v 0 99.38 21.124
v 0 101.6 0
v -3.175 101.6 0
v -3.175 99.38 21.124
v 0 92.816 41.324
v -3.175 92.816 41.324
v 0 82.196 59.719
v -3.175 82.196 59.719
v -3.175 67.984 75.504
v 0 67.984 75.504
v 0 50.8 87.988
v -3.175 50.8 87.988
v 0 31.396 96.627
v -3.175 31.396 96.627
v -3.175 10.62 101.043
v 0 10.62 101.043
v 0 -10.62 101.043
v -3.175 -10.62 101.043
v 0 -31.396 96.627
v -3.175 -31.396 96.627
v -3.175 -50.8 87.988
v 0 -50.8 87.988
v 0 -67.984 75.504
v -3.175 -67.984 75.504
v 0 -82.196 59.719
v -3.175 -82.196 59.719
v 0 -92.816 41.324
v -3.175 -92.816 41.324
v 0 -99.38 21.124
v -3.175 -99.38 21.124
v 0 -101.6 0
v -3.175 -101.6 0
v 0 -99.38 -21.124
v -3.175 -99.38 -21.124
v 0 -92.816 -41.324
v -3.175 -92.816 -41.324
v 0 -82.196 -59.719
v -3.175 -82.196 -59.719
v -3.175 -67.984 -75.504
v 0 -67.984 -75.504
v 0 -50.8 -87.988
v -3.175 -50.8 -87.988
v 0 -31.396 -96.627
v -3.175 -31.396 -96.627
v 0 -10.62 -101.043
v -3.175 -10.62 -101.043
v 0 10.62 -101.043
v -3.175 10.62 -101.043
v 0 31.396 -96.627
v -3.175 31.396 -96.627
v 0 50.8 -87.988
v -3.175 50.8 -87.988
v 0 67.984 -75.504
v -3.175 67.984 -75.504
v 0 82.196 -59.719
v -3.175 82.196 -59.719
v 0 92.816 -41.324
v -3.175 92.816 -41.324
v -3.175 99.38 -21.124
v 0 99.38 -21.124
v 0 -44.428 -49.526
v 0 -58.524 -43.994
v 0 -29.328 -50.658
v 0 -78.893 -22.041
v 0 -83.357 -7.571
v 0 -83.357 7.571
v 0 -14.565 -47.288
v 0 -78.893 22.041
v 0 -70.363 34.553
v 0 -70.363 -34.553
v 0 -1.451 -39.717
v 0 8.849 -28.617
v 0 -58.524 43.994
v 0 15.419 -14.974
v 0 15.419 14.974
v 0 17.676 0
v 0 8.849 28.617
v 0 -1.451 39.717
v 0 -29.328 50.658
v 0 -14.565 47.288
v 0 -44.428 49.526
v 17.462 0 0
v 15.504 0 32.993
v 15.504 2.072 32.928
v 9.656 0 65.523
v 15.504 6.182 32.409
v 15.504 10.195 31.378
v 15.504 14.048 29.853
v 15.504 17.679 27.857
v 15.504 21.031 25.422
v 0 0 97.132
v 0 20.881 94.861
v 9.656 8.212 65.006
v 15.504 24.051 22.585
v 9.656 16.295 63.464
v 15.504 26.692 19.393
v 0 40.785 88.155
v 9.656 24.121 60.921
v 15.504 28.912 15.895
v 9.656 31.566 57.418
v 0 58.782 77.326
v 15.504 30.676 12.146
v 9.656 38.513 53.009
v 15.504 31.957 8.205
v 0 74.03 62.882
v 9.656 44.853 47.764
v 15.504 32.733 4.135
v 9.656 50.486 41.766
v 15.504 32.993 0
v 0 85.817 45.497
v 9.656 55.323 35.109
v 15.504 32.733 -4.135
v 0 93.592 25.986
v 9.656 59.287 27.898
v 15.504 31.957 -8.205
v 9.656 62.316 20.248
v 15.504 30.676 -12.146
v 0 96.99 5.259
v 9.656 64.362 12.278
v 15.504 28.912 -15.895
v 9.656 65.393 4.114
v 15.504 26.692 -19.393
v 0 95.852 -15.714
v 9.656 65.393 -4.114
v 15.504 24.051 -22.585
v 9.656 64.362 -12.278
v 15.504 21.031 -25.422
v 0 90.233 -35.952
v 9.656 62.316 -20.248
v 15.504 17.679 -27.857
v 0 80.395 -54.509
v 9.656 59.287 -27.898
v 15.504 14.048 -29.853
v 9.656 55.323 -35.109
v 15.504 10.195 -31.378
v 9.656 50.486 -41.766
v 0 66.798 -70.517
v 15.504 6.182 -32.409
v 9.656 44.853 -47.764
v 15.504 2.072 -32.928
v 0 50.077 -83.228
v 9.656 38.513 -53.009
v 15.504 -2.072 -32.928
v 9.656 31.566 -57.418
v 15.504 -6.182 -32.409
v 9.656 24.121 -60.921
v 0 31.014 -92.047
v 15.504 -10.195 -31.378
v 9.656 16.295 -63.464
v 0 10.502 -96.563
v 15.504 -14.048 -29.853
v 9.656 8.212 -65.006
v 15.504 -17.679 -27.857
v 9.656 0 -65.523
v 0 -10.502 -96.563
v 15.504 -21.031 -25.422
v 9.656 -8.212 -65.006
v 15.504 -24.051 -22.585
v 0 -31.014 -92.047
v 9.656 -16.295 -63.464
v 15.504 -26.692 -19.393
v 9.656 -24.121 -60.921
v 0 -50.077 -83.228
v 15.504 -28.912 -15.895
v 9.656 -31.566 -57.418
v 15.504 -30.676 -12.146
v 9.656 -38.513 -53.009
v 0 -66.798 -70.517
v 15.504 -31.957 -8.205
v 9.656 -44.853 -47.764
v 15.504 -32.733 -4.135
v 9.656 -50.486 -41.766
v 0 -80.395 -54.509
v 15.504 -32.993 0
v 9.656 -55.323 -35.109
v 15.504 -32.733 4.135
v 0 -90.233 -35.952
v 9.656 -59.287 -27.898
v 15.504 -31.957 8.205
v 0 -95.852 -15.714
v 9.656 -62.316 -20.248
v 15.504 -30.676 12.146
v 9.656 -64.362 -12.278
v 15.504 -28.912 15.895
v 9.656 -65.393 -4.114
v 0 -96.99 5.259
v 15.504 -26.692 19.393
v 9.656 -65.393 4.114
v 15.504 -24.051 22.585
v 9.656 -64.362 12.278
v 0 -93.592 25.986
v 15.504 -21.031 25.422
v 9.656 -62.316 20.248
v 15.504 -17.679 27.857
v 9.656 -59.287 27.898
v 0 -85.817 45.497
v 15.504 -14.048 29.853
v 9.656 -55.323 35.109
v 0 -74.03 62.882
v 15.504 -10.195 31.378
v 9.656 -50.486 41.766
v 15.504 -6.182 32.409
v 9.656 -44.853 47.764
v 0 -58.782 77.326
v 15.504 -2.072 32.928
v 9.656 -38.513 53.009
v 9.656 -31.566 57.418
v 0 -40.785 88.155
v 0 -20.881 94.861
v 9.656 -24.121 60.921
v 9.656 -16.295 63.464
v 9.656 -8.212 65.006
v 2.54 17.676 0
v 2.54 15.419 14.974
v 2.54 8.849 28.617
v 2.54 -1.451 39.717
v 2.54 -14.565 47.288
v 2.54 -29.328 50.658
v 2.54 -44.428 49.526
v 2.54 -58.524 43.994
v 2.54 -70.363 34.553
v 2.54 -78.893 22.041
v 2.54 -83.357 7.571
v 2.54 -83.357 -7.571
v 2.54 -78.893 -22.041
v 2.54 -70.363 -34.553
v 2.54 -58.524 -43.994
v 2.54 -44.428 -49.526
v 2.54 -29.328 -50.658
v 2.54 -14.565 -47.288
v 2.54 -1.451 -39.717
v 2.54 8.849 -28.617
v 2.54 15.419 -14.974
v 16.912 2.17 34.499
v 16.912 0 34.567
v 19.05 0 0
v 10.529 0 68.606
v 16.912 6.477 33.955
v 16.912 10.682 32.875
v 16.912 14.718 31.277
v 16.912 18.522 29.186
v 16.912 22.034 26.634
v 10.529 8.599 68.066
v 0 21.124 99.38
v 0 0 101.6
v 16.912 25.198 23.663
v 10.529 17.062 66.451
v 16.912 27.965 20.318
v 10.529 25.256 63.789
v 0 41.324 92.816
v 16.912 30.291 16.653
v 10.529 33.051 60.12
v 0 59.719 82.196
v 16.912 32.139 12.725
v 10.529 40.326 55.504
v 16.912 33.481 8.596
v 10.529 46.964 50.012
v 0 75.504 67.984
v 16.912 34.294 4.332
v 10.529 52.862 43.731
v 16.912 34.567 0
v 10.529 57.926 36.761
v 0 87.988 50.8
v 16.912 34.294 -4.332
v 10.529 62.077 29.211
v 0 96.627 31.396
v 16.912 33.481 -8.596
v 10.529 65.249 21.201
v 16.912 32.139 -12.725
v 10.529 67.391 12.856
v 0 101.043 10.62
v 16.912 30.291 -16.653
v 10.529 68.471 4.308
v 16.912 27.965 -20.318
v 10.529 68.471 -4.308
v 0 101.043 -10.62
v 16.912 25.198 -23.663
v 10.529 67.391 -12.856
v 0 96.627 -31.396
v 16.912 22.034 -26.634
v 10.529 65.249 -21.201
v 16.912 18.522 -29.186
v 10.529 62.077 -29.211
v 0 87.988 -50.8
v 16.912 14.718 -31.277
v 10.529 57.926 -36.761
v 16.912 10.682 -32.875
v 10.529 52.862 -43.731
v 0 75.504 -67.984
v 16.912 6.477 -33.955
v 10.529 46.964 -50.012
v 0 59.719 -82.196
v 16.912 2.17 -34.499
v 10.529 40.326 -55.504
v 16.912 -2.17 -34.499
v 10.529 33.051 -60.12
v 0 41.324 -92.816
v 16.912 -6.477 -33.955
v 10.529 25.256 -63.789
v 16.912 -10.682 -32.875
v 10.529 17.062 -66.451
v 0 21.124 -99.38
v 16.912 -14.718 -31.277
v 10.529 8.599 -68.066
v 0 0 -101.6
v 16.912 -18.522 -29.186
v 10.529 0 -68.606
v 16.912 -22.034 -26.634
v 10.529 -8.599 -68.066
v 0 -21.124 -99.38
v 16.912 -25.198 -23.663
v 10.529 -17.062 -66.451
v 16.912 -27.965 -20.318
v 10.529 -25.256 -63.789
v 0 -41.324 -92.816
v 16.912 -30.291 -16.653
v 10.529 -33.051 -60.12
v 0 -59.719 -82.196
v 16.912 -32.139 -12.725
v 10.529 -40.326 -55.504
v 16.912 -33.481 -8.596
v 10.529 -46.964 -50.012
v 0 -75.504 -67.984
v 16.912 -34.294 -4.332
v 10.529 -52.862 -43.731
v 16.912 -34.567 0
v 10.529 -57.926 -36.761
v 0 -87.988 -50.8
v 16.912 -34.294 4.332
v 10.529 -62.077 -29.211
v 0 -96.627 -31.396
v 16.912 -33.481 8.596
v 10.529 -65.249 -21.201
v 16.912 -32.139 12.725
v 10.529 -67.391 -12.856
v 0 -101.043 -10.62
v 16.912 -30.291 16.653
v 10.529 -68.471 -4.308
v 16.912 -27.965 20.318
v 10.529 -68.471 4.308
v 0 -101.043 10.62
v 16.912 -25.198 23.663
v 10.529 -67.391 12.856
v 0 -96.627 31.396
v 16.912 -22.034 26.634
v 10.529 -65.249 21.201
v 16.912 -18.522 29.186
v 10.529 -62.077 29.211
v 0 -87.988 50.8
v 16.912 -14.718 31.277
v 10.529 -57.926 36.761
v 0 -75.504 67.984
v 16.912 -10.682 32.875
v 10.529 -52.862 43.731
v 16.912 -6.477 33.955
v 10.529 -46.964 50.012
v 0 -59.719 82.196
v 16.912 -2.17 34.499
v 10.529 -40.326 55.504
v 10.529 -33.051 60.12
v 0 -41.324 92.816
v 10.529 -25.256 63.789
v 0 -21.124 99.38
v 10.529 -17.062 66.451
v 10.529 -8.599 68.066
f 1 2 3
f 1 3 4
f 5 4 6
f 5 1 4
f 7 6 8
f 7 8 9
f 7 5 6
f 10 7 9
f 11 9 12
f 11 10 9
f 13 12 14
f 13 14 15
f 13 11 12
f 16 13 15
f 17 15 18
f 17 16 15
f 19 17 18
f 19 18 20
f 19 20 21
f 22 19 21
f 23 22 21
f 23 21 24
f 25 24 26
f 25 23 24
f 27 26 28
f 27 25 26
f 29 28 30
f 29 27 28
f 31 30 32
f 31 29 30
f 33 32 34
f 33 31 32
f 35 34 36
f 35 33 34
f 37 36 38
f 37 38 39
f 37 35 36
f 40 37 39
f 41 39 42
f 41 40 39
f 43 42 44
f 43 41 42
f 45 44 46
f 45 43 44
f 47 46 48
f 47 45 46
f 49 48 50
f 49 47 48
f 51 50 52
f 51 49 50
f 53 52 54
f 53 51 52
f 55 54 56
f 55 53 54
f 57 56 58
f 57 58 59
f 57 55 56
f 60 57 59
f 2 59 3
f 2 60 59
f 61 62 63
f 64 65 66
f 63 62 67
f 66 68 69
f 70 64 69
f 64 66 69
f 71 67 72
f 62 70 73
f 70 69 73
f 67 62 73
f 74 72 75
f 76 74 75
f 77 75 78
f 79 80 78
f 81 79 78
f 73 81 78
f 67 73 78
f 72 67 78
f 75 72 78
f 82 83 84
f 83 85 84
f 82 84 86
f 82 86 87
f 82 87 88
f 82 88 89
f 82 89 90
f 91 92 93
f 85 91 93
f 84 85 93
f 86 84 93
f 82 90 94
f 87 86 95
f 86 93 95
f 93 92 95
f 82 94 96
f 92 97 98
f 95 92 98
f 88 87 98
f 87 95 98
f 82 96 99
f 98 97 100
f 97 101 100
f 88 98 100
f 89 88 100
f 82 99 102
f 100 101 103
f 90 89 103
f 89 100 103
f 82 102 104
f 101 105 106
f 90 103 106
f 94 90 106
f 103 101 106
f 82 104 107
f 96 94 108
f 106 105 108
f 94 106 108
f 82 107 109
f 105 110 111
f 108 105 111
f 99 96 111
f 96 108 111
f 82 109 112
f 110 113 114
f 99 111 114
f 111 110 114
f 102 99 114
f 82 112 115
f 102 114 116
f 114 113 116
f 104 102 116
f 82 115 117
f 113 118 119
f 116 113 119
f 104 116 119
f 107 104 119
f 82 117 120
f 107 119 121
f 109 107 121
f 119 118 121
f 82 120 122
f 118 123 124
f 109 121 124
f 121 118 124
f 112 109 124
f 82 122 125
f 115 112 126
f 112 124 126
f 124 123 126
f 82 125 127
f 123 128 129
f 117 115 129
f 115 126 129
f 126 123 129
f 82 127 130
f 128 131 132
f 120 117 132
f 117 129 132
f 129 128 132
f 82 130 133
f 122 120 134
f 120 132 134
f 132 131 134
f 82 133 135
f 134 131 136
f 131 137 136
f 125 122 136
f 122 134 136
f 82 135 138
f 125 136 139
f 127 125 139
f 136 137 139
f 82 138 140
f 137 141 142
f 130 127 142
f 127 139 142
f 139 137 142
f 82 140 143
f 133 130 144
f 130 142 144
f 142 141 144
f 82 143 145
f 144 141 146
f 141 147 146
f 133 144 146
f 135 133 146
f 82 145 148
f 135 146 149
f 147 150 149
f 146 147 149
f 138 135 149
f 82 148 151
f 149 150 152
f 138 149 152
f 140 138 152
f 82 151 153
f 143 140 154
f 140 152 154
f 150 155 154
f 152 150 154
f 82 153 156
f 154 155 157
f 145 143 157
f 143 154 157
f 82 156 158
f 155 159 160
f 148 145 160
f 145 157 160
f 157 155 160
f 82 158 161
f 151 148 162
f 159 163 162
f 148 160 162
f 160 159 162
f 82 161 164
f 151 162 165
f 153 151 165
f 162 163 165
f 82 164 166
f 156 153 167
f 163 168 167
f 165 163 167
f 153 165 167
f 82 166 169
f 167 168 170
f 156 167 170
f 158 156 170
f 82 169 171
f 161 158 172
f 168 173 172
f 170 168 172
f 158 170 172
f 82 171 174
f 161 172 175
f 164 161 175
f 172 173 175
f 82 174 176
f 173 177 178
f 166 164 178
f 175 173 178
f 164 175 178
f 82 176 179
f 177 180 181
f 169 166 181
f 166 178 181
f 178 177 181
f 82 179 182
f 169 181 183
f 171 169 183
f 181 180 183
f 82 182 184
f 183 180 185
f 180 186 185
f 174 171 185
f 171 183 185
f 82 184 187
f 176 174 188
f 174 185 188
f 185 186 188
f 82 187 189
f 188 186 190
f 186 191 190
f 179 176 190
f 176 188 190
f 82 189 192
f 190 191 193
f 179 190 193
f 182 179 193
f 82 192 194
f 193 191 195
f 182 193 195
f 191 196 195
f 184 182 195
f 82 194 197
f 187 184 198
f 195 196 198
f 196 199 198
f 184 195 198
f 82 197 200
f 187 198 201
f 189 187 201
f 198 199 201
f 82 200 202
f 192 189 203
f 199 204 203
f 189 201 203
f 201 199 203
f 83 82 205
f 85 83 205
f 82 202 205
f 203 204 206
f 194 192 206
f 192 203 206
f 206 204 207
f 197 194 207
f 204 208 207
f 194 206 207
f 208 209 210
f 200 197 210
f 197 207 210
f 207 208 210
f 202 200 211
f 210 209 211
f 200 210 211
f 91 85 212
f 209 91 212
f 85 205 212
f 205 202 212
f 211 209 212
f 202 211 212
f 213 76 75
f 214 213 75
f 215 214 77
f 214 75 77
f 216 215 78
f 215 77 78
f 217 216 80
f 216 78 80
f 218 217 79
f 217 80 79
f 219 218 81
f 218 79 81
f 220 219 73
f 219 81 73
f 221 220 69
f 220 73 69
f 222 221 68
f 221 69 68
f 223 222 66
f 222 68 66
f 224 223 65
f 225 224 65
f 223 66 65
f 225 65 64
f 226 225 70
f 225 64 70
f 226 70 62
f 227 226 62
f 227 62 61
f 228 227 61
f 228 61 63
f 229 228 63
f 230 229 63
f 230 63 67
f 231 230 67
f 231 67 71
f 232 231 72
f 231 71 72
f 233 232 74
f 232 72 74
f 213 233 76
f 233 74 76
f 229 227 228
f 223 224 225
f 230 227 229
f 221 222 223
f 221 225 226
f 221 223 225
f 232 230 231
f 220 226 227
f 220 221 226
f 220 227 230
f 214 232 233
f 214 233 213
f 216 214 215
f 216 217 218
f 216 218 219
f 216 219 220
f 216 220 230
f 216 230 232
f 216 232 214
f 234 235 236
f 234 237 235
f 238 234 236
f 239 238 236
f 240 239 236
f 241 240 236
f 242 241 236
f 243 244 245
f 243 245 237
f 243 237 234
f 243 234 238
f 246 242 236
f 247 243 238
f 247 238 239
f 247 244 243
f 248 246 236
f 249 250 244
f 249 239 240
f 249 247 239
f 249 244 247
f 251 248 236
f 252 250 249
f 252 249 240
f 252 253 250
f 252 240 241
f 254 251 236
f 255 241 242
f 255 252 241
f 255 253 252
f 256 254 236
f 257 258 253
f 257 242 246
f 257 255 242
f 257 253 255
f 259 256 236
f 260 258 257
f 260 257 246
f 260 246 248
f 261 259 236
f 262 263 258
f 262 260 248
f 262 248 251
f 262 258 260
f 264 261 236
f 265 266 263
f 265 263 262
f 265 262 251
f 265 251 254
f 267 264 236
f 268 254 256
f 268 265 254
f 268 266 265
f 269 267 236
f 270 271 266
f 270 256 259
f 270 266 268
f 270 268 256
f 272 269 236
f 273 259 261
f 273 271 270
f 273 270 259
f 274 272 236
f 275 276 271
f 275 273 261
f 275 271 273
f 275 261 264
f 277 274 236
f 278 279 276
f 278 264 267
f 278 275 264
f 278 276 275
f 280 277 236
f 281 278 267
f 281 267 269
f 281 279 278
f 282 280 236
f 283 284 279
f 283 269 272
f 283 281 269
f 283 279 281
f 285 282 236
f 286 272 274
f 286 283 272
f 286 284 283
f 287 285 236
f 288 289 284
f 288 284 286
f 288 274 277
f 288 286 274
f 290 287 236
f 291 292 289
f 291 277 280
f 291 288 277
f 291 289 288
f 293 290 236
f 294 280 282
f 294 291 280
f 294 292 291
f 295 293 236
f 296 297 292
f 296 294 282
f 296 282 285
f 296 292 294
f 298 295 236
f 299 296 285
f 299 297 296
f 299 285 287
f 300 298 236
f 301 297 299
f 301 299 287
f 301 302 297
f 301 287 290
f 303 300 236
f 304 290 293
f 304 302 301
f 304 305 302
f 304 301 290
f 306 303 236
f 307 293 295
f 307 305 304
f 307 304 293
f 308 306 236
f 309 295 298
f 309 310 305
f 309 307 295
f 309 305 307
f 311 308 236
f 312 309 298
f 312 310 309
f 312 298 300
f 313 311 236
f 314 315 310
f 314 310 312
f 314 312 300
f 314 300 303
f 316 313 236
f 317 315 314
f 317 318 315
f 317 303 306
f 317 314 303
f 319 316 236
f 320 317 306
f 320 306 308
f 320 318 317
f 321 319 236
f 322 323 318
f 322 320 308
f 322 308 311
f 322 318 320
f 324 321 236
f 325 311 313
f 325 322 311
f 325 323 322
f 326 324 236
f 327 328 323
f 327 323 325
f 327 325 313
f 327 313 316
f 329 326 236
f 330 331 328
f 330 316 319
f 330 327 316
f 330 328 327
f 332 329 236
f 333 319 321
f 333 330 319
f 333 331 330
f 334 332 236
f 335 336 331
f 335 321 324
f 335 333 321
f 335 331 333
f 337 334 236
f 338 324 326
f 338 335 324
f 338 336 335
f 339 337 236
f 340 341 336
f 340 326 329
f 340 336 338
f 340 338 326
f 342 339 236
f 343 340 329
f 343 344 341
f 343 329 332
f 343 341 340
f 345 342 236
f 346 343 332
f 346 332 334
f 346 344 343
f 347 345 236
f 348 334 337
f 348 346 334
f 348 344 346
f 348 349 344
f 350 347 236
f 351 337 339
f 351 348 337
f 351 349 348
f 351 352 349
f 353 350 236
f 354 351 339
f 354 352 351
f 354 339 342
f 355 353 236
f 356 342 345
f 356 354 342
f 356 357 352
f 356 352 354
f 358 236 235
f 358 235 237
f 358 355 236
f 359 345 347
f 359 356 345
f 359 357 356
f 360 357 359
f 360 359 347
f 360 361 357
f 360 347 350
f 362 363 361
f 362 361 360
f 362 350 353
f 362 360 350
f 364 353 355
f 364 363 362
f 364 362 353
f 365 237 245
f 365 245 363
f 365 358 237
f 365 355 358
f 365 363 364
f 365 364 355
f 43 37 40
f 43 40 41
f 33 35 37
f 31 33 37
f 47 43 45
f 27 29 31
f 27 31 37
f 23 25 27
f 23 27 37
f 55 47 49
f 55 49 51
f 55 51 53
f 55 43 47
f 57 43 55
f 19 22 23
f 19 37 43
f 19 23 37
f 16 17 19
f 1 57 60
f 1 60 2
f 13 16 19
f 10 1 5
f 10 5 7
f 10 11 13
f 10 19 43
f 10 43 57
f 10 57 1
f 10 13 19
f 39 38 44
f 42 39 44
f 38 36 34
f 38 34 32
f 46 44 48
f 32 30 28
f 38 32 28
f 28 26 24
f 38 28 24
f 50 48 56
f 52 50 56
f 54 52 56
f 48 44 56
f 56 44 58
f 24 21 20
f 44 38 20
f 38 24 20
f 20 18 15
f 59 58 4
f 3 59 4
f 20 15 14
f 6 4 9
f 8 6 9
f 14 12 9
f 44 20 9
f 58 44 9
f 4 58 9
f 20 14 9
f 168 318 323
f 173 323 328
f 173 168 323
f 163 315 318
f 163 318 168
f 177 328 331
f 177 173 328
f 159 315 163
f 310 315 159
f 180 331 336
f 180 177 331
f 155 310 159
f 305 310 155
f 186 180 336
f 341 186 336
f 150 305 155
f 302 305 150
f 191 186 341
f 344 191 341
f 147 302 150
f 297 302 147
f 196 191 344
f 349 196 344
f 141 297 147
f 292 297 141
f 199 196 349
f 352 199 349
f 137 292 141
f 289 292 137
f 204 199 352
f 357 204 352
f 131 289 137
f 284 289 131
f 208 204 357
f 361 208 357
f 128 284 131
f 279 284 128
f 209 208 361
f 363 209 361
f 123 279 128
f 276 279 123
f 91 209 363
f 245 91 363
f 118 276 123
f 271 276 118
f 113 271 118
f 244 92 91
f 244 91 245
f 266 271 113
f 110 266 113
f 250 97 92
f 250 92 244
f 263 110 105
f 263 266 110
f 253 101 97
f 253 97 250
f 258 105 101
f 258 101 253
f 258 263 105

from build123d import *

# Parameters (mm, degrees)
F0_R     = 101.6
F1_DEPTH = 3.175
F4_T     = -1.5875
F5_R     = 50.8
F6_DEPTH = 2.54


with BuildPart() as f1:
    # F0 (on Right) → F1 (new body)
    with BuildSketch(Plane.YZ):
        Circle(F0_R)
    extrude(amount=-F1_DEPTH)


with BuildPart() as f3:
    # F2 (on Front) → F3 (revolve)
    with BuildSketch(Plane.XZ):
        with BuildLine():
            ThreePointArc((19.05, 0), (14.246362094, 51.6852553926), (0, 101.6))
            Line((0, 101.6), (0, 0))
            Line((0, 0), (19.05, 0))
        make_face()
    revolve(axis=Axis((9.525, 0, 0), (-1, 0, 0)))

    # F4
    f4_openings = [f3.faces().sort_by_distance(p)[0] for p in [
        (0, 0, 0),
    ]]
    offset(amount=F4_T, openings=f4_openings)


with BuildPart() as f6:
    # F5 (on face) → F6 (new body)
    with BuildSketch(Plane.YZ):
        with Locations((-46.3319975493, 0)):
            Circle(F5_R)
    extrude(amount=F6_DEPTH)


with BuildPart() as f6_1:
    # F7: moved
    add(f6.part.moved(Location((0, 13.208, 0))))


solid = Compound([f1.part, f3.part, f6_1.part])
